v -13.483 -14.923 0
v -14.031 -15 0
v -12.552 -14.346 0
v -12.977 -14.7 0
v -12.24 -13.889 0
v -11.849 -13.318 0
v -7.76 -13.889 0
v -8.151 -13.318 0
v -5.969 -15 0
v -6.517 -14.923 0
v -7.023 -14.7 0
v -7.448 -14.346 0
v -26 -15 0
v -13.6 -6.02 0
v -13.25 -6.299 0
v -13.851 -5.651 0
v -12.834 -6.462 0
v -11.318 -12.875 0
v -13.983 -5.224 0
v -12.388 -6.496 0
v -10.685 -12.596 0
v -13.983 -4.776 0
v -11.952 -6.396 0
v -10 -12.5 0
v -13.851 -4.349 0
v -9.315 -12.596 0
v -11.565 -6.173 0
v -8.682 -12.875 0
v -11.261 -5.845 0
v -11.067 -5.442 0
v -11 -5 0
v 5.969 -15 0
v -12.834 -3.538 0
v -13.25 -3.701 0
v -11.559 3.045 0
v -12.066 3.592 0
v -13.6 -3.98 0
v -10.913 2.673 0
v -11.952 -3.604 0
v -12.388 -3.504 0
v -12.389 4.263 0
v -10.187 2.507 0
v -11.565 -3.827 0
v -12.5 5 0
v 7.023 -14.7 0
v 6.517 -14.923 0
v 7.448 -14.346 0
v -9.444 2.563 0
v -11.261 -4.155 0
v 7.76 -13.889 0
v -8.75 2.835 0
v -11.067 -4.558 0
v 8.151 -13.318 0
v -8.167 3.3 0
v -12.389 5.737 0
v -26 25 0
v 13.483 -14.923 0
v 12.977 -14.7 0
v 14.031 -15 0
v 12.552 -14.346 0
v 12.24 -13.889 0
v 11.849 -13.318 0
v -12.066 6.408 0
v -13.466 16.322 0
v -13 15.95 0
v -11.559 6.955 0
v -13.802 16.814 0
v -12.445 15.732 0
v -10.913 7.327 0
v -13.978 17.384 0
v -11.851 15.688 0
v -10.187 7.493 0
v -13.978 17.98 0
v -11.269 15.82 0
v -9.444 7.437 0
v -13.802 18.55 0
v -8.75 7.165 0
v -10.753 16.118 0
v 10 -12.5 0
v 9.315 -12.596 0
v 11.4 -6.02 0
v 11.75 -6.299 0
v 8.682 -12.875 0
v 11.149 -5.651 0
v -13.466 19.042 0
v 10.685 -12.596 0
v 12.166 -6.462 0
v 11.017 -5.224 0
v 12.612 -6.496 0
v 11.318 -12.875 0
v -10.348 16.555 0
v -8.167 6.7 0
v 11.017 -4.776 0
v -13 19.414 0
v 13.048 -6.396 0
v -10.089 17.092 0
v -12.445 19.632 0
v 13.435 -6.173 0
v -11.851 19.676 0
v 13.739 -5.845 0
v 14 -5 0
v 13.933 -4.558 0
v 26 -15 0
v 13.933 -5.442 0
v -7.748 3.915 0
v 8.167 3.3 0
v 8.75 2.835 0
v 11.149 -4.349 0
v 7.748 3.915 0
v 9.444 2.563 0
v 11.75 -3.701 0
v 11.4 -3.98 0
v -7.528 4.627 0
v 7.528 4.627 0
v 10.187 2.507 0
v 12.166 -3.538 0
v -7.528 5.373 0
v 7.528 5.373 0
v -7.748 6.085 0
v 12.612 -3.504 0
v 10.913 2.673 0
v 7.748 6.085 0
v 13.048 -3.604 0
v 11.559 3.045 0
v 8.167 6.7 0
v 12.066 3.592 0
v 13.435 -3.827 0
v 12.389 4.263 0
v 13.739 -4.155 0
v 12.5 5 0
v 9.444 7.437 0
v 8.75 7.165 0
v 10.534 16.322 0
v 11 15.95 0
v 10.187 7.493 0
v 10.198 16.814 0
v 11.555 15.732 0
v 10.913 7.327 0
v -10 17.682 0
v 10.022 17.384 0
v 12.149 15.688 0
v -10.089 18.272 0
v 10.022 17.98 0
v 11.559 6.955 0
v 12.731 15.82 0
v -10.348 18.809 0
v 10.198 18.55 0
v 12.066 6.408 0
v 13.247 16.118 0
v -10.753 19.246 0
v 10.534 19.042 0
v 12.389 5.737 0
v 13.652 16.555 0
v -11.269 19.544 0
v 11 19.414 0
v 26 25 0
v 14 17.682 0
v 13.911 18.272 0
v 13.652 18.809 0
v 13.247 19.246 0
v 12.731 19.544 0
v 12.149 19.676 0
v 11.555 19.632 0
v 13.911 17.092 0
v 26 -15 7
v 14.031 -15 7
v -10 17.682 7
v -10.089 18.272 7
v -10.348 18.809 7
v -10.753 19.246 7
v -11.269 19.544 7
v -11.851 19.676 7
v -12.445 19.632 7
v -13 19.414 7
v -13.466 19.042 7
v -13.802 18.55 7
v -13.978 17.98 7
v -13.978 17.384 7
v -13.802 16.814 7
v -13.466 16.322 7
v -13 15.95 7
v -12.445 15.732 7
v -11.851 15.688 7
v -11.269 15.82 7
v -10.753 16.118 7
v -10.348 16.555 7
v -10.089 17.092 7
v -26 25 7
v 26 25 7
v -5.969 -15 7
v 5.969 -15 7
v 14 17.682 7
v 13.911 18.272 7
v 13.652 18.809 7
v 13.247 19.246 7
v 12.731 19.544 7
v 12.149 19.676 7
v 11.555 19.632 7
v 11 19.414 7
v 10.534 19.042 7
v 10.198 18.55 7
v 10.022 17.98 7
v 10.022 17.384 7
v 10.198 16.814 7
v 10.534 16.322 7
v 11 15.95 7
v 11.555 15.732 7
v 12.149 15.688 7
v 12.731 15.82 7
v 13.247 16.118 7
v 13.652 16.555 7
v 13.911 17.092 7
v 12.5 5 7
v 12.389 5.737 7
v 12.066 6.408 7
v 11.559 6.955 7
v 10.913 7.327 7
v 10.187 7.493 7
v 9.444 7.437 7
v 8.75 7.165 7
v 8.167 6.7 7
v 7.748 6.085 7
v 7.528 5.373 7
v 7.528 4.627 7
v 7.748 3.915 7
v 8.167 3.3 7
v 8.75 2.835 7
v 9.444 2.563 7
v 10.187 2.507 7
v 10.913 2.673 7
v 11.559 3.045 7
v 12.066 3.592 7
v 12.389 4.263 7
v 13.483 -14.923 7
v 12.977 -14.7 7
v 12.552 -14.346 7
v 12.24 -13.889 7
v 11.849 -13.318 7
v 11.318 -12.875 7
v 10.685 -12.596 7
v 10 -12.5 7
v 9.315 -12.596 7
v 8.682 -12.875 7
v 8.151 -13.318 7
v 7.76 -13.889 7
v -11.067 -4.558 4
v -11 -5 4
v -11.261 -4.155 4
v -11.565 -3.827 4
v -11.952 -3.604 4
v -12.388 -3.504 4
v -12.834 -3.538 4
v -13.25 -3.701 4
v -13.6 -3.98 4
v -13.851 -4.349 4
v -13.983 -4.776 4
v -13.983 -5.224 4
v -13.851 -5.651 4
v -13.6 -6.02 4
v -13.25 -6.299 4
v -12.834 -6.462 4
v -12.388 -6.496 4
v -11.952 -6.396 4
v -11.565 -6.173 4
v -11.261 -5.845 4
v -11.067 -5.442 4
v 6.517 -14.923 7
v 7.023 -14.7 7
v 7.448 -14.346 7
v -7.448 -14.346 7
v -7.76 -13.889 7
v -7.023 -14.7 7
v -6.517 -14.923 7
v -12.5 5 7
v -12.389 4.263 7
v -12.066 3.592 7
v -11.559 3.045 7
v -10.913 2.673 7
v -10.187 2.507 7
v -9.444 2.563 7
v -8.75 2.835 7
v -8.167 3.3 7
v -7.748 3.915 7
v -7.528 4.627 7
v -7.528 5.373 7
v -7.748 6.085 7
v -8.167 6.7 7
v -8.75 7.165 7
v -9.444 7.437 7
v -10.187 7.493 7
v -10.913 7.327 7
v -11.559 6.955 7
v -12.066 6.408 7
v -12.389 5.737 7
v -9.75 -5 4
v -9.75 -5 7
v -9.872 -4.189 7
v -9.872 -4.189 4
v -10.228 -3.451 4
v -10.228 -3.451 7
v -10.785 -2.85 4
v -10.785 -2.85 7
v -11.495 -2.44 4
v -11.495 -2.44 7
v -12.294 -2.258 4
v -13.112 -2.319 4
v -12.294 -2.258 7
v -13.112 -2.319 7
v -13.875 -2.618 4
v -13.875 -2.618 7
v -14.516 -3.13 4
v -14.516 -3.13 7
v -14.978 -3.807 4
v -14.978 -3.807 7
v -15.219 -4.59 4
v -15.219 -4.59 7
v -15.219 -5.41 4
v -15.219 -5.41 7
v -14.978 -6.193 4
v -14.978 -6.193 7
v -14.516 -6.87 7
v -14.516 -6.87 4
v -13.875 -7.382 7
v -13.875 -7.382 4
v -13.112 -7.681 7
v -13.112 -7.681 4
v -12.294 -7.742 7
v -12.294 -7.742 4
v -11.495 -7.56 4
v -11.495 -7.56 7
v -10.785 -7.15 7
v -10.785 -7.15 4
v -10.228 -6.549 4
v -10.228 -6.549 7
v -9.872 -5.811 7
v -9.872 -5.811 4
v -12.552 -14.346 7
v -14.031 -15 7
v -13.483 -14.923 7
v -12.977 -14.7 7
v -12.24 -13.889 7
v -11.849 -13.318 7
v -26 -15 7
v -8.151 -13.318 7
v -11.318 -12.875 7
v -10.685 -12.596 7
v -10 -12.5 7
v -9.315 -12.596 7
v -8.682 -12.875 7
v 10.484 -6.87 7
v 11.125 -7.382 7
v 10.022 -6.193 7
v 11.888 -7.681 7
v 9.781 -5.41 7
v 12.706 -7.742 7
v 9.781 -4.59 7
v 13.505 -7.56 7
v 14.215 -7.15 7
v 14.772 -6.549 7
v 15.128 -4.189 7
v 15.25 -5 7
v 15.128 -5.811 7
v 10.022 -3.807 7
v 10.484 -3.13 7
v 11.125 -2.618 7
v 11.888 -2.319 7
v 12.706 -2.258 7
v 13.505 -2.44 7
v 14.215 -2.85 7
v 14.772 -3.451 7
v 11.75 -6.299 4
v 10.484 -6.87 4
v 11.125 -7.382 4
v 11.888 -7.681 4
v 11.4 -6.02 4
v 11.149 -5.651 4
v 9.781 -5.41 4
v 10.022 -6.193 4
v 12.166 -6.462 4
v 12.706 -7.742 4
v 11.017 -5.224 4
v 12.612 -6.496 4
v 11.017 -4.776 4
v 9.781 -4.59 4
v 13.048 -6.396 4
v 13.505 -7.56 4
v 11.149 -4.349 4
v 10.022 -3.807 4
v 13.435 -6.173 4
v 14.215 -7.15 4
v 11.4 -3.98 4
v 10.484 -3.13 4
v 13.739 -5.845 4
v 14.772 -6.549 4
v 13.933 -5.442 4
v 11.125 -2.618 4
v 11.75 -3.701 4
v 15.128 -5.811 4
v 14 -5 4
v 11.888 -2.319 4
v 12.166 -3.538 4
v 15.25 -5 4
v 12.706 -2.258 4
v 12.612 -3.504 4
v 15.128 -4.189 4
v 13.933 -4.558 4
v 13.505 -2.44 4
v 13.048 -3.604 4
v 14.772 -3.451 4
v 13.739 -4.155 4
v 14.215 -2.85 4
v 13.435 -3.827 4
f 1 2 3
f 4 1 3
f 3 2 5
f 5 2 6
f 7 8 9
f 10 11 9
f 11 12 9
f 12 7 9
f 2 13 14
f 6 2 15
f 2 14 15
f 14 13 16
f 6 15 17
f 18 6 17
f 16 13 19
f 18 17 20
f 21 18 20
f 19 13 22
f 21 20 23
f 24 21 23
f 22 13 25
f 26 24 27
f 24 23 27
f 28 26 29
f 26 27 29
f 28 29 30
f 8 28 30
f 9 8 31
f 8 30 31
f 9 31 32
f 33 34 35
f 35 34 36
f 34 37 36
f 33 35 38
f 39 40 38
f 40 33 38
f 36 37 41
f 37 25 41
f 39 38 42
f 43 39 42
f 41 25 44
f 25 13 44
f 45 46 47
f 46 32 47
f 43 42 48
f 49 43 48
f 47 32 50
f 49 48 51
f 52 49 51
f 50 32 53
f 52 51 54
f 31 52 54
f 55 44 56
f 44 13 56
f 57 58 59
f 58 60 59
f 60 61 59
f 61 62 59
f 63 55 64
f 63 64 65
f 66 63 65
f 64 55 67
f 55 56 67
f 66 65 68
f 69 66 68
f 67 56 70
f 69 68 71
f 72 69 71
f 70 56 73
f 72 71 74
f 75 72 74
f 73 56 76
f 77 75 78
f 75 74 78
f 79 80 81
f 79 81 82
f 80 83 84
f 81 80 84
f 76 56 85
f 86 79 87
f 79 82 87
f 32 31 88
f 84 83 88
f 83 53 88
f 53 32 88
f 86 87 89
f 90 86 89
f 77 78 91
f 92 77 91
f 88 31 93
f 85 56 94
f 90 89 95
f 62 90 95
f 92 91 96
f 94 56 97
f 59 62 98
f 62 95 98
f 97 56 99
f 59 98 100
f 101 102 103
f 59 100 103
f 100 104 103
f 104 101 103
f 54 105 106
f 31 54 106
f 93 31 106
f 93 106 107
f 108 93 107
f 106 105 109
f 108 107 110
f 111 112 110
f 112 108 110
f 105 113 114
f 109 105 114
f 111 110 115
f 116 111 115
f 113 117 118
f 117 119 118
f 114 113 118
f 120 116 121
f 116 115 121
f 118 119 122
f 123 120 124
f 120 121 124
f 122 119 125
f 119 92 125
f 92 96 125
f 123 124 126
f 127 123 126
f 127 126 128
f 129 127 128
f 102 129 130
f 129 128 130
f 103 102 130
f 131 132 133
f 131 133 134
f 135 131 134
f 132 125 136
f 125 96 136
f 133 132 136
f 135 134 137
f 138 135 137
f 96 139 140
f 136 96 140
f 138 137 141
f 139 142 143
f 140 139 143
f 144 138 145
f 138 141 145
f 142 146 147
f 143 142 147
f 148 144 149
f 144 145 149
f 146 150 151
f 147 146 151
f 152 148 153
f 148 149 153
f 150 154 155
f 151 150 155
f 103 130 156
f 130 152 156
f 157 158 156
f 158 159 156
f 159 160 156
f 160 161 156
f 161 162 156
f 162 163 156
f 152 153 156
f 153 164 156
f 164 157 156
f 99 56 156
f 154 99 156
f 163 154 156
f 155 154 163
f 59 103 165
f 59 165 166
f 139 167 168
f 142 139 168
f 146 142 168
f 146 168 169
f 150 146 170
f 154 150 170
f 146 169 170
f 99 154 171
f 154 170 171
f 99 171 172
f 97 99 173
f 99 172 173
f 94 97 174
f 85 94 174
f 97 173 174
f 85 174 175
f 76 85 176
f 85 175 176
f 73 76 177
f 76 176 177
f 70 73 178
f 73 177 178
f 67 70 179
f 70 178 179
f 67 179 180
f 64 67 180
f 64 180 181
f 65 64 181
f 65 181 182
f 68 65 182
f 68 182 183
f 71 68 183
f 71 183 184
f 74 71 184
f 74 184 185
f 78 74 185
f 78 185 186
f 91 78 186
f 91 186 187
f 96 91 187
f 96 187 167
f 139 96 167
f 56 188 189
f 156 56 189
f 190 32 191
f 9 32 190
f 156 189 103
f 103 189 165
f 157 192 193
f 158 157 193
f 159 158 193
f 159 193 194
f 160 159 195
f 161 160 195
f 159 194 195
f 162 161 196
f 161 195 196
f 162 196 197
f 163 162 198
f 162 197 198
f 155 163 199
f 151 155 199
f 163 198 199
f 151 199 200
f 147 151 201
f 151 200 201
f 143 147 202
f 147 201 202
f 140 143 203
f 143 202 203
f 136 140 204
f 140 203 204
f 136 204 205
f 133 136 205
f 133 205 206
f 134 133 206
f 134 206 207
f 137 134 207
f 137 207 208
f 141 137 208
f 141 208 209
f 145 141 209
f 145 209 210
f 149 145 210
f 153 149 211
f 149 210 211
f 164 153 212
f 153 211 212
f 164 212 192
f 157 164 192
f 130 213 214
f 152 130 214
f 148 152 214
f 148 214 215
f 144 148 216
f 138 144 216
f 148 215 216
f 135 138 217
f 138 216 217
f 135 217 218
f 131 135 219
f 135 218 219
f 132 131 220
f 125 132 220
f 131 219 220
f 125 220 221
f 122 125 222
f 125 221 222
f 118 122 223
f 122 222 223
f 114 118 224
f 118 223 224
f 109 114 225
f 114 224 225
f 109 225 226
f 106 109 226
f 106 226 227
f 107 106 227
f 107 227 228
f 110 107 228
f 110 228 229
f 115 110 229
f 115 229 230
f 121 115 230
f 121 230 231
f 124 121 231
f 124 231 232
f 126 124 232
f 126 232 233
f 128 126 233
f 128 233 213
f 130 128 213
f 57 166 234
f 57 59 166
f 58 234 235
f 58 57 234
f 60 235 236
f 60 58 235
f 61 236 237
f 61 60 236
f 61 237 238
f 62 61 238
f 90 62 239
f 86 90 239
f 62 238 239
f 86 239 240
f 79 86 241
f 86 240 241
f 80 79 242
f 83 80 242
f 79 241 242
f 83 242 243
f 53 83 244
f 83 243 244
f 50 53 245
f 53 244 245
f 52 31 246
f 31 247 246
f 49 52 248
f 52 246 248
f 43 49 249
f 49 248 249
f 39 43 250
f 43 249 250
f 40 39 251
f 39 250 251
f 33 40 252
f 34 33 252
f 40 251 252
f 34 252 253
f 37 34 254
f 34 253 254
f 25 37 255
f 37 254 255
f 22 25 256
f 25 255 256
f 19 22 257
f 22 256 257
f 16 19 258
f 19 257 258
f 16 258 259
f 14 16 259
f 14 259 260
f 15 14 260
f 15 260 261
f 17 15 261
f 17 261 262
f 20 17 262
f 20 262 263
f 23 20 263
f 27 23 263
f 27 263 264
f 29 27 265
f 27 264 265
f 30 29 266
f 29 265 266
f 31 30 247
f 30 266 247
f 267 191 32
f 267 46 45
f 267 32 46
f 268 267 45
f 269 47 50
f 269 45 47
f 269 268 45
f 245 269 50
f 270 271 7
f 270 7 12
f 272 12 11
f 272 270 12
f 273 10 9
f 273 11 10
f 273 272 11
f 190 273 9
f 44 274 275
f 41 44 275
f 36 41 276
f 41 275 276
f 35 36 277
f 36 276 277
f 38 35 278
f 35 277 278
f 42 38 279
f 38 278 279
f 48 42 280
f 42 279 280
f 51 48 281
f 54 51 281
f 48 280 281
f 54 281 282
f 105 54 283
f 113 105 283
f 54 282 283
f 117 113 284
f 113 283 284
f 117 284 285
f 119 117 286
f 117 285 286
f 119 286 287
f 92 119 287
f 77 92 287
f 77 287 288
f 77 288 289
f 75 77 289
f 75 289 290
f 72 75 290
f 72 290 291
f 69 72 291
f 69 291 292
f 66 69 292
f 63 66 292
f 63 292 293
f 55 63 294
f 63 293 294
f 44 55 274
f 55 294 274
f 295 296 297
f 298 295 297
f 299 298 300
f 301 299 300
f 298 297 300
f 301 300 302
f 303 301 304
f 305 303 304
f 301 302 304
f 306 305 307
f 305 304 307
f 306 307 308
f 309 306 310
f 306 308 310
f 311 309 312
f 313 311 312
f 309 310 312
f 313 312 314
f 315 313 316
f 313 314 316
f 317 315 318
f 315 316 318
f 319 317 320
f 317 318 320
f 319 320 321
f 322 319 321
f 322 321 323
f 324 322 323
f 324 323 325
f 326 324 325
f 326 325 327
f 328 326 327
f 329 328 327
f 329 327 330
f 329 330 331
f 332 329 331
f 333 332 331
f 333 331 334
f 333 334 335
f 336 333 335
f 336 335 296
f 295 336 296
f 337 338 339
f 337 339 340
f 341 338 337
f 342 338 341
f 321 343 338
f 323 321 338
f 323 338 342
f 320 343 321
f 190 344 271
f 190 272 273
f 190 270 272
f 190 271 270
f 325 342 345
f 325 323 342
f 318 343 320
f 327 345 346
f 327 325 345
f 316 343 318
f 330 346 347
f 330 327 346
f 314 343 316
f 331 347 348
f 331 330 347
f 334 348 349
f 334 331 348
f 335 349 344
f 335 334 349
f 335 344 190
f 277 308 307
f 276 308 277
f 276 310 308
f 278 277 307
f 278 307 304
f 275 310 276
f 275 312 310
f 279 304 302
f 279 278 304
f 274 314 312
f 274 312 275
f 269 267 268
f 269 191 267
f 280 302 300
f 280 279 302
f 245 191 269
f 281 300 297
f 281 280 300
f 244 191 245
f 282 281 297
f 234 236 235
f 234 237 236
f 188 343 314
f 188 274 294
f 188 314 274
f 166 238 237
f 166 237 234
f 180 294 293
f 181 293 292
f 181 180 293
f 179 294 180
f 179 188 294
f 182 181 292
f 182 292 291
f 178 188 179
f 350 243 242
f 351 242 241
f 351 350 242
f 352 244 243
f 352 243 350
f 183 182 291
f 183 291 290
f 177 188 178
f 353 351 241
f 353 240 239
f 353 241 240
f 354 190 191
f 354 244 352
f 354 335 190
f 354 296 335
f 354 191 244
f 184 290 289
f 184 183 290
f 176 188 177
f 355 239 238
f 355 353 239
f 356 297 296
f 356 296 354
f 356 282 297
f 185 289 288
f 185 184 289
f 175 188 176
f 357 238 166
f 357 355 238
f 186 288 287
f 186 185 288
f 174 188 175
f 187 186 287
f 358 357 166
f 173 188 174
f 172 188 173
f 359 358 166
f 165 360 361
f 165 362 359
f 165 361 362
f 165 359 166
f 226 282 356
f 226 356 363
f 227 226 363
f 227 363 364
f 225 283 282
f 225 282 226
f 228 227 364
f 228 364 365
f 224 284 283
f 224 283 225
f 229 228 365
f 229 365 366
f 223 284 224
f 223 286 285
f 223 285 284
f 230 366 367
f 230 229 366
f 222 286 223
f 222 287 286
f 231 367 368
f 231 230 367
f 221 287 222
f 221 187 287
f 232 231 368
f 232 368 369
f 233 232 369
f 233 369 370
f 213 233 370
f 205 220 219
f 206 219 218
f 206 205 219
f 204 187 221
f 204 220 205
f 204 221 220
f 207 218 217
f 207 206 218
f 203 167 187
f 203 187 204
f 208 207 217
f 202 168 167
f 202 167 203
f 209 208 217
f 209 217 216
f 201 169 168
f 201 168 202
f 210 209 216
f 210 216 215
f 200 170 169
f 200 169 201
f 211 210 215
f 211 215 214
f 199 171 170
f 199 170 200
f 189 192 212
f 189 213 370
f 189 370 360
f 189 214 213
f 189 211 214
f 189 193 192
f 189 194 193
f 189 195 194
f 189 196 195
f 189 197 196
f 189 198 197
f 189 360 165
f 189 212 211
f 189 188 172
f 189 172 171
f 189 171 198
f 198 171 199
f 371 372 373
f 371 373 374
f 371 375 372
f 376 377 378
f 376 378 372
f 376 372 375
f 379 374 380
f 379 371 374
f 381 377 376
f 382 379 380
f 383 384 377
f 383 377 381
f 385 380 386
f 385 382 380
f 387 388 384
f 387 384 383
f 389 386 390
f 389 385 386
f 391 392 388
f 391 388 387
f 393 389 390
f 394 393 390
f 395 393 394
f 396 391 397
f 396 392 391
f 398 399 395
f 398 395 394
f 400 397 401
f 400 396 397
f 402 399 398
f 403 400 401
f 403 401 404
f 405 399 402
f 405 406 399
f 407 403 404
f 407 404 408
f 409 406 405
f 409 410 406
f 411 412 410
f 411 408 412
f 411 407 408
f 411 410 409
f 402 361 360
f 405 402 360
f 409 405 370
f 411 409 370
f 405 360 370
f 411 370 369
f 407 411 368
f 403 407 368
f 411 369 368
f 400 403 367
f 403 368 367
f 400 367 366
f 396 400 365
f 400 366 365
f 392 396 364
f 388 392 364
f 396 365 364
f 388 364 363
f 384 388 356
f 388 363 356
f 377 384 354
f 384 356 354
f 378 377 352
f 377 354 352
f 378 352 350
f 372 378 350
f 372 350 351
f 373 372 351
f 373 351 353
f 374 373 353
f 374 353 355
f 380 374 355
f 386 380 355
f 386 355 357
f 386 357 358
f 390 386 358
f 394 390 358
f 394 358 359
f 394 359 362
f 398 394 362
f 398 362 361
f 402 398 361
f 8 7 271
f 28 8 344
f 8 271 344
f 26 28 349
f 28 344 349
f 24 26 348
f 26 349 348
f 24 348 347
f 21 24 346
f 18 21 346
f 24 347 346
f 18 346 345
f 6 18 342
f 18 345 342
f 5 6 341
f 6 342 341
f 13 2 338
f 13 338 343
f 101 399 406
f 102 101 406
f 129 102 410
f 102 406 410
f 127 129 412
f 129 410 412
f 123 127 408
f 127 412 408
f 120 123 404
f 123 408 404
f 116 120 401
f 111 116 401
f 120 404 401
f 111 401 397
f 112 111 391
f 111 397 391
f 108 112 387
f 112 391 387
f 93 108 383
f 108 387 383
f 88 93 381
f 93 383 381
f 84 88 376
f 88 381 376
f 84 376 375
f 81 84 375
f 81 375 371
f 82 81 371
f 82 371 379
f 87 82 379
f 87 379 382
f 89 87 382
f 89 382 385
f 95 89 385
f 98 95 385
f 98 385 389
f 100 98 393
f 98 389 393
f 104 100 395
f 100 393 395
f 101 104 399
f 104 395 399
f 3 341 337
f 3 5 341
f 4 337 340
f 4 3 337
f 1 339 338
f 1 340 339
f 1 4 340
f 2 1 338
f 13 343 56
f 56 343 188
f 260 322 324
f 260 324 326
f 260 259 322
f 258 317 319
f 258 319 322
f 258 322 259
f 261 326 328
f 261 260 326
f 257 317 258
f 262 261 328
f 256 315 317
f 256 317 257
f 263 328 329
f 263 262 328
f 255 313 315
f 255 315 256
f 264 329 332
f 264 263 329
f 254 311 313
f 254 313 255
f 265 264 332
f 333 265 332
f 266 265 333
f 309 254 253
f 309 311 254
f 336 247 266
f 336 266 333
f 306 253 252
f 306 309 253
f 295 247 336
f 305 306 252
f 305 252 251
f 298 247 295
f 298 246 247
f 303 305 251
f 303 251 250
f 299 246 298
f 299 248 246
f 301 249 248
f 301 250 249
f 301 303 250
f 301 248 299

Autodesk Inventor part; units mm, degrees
ref_plane "YZ Plane" through (0, 0, 0) normal (1, 0, 0) x (0, 1, 0)
ref_plane "XZ Plane" through (0, 0, 0) normal (0, 1, 0) x (-1, 0, 0)
ref_plane "XY Plane" through (0, 0, 0) normal (0, 0, 1) x (1, 0, 0)
sketch "Boceto21" plane through (0, 0, 0) normal (0, 0, 1) x (1, 0, 0)
  line L0 (-26, 15) -> (26, 15)
  line L1 (26, 15) -> (26, -15)
  line L2 (26, -15) -> (-26, -15)
  line L3 (-26, -15) -> (-26, 15)
  line L4 (1.8793, 0) -> (0, 0)
  line L5 (0, 0) -> (0, 2.1218)
  dimension "d96" = 52
  dimension "d97" = 30
extrude "Extrusión17" add sketch "Boceto21" along normal blind 7
sketch "Boceto22" plane through (0, 0, 7) normal (0, 0, 1) x (1, 0, 0)
  circle A0 centre (-12.5, -5) radius 1.5
  circle A1 centre (12.5, -5) radius 1.5
  line L0 (-26, -15) -> (26, -15) projected
  point P0 (0, 0)
  dimension "d100" = 3
  dimension "d101" = 3
  dimension "d104" = 10
  dimension "d105" = 10
  dimension "d106" = 25
  dimension "d107" = 12.5
extrude "Extrusión18" cut sketch "Boceto22" against normal through all
sketch "Boceto23" plane through (0, 0, 7) normal (0, 0, 1) x (1, 0, 0)
  circle A0 centre (10, 5) radius 2.5
  circle A1 centre (10, -15) radius 2.5
  circle A2 centre (12.5, -5) radius 1.5 projected
  point P0 (0, 0)
  dimension "d110" = 5
  dimension "d111" = 5
  dimension "d112" = 10
  dimension "d113" = 10
  dimension "d114" = 20
  dimension "d115" = 10
extrude "Extrusión19" cut sketch "Boceto23" against normal through all contours A0 | A1
mirror "Simetría1" about plane through (0, 0, 0) normal (1, 0, 0) of "Extrusión19"
fillet "Empalme5" radius 2 4 edges at (-12.5, -15, 3.5) (-7.5, -15, 3.5) (12.5, -15, 3.5) (7.5, -15, 3.5)
sketch "Boceto24" plane through (0, 0, 7) normal (0, 0, 1) x (1, 0, 0)
  circle A0 centre (12.5, -5) radius 1.5 projected
  circle A1 centre (12.5, -5) radius 2.75
  circle A2 centre (-12.5, -5) radius 1.5 projected
  circle A3 centre (-12.5, -5) radius 2.75
  point P0 (0, 0)
  dimension "d119" = 5.5
  dimension "d120" = 5.5
extrude "Extrusión20" cut sketch "Boceto24" against normal blind 3
sketch "Boceto25" plane through (0, 0, 7) normal (0, 0, 1) x (1, 0, 0)
  line L0 (26, 15) -> (-26, 15)
  line L1 (-26, 15) -> (-26, 25)
  line L2 (-26, 25) -> (26, 25)
  line L3 (26, 25) -> (26, 15)
  point P0 (0, 0)
  dimension "d123" = 10
extrude "Extrusión21" add sketch "Boceto25" against normal up to surface (7 mm away)
sketch "Boceto26" plane through (0, 0, 7) normal (0, 0, 1) x (1, 0, 0)
  circle A0 centre (12, 17.682) radius 2
  circle A1 centre (12.5, -5) radius 2.75 projected
  circle A2 centre (-12, 17.682) radius 2
  circle A3 centre (-12.5, -5) radius 2.75 projected
  circle A4 centre (10, 5) radius 2.5 projected
  circle A5 centre (-10, 5) radius 2.5 projected
  point P0 (0, 0)
  dimension "d127" = 12
  dimension "d128" = 4
  dimension "d129" = 4
  dimension "d132" = 12
  dimension "d135" = 12.682
  dimension "d136" = 12.682
extrude "Extrusión22" cut sketch "Boceto26" against normal through all contours A0 | A2
equation "\"d101\" = d100"
equation "\"d105\" = d104"
equation "\"d107\" = 0.5 * d106"
equation "\"d111\" = d110"
equation "\"d113\" = d112"
equation "\"d120\" = d119"
equation "\"d128\" = d129"
equation "\"d136\" = d135"
properties part number "Soporte Extruder Izq" material "Polipropileno"
